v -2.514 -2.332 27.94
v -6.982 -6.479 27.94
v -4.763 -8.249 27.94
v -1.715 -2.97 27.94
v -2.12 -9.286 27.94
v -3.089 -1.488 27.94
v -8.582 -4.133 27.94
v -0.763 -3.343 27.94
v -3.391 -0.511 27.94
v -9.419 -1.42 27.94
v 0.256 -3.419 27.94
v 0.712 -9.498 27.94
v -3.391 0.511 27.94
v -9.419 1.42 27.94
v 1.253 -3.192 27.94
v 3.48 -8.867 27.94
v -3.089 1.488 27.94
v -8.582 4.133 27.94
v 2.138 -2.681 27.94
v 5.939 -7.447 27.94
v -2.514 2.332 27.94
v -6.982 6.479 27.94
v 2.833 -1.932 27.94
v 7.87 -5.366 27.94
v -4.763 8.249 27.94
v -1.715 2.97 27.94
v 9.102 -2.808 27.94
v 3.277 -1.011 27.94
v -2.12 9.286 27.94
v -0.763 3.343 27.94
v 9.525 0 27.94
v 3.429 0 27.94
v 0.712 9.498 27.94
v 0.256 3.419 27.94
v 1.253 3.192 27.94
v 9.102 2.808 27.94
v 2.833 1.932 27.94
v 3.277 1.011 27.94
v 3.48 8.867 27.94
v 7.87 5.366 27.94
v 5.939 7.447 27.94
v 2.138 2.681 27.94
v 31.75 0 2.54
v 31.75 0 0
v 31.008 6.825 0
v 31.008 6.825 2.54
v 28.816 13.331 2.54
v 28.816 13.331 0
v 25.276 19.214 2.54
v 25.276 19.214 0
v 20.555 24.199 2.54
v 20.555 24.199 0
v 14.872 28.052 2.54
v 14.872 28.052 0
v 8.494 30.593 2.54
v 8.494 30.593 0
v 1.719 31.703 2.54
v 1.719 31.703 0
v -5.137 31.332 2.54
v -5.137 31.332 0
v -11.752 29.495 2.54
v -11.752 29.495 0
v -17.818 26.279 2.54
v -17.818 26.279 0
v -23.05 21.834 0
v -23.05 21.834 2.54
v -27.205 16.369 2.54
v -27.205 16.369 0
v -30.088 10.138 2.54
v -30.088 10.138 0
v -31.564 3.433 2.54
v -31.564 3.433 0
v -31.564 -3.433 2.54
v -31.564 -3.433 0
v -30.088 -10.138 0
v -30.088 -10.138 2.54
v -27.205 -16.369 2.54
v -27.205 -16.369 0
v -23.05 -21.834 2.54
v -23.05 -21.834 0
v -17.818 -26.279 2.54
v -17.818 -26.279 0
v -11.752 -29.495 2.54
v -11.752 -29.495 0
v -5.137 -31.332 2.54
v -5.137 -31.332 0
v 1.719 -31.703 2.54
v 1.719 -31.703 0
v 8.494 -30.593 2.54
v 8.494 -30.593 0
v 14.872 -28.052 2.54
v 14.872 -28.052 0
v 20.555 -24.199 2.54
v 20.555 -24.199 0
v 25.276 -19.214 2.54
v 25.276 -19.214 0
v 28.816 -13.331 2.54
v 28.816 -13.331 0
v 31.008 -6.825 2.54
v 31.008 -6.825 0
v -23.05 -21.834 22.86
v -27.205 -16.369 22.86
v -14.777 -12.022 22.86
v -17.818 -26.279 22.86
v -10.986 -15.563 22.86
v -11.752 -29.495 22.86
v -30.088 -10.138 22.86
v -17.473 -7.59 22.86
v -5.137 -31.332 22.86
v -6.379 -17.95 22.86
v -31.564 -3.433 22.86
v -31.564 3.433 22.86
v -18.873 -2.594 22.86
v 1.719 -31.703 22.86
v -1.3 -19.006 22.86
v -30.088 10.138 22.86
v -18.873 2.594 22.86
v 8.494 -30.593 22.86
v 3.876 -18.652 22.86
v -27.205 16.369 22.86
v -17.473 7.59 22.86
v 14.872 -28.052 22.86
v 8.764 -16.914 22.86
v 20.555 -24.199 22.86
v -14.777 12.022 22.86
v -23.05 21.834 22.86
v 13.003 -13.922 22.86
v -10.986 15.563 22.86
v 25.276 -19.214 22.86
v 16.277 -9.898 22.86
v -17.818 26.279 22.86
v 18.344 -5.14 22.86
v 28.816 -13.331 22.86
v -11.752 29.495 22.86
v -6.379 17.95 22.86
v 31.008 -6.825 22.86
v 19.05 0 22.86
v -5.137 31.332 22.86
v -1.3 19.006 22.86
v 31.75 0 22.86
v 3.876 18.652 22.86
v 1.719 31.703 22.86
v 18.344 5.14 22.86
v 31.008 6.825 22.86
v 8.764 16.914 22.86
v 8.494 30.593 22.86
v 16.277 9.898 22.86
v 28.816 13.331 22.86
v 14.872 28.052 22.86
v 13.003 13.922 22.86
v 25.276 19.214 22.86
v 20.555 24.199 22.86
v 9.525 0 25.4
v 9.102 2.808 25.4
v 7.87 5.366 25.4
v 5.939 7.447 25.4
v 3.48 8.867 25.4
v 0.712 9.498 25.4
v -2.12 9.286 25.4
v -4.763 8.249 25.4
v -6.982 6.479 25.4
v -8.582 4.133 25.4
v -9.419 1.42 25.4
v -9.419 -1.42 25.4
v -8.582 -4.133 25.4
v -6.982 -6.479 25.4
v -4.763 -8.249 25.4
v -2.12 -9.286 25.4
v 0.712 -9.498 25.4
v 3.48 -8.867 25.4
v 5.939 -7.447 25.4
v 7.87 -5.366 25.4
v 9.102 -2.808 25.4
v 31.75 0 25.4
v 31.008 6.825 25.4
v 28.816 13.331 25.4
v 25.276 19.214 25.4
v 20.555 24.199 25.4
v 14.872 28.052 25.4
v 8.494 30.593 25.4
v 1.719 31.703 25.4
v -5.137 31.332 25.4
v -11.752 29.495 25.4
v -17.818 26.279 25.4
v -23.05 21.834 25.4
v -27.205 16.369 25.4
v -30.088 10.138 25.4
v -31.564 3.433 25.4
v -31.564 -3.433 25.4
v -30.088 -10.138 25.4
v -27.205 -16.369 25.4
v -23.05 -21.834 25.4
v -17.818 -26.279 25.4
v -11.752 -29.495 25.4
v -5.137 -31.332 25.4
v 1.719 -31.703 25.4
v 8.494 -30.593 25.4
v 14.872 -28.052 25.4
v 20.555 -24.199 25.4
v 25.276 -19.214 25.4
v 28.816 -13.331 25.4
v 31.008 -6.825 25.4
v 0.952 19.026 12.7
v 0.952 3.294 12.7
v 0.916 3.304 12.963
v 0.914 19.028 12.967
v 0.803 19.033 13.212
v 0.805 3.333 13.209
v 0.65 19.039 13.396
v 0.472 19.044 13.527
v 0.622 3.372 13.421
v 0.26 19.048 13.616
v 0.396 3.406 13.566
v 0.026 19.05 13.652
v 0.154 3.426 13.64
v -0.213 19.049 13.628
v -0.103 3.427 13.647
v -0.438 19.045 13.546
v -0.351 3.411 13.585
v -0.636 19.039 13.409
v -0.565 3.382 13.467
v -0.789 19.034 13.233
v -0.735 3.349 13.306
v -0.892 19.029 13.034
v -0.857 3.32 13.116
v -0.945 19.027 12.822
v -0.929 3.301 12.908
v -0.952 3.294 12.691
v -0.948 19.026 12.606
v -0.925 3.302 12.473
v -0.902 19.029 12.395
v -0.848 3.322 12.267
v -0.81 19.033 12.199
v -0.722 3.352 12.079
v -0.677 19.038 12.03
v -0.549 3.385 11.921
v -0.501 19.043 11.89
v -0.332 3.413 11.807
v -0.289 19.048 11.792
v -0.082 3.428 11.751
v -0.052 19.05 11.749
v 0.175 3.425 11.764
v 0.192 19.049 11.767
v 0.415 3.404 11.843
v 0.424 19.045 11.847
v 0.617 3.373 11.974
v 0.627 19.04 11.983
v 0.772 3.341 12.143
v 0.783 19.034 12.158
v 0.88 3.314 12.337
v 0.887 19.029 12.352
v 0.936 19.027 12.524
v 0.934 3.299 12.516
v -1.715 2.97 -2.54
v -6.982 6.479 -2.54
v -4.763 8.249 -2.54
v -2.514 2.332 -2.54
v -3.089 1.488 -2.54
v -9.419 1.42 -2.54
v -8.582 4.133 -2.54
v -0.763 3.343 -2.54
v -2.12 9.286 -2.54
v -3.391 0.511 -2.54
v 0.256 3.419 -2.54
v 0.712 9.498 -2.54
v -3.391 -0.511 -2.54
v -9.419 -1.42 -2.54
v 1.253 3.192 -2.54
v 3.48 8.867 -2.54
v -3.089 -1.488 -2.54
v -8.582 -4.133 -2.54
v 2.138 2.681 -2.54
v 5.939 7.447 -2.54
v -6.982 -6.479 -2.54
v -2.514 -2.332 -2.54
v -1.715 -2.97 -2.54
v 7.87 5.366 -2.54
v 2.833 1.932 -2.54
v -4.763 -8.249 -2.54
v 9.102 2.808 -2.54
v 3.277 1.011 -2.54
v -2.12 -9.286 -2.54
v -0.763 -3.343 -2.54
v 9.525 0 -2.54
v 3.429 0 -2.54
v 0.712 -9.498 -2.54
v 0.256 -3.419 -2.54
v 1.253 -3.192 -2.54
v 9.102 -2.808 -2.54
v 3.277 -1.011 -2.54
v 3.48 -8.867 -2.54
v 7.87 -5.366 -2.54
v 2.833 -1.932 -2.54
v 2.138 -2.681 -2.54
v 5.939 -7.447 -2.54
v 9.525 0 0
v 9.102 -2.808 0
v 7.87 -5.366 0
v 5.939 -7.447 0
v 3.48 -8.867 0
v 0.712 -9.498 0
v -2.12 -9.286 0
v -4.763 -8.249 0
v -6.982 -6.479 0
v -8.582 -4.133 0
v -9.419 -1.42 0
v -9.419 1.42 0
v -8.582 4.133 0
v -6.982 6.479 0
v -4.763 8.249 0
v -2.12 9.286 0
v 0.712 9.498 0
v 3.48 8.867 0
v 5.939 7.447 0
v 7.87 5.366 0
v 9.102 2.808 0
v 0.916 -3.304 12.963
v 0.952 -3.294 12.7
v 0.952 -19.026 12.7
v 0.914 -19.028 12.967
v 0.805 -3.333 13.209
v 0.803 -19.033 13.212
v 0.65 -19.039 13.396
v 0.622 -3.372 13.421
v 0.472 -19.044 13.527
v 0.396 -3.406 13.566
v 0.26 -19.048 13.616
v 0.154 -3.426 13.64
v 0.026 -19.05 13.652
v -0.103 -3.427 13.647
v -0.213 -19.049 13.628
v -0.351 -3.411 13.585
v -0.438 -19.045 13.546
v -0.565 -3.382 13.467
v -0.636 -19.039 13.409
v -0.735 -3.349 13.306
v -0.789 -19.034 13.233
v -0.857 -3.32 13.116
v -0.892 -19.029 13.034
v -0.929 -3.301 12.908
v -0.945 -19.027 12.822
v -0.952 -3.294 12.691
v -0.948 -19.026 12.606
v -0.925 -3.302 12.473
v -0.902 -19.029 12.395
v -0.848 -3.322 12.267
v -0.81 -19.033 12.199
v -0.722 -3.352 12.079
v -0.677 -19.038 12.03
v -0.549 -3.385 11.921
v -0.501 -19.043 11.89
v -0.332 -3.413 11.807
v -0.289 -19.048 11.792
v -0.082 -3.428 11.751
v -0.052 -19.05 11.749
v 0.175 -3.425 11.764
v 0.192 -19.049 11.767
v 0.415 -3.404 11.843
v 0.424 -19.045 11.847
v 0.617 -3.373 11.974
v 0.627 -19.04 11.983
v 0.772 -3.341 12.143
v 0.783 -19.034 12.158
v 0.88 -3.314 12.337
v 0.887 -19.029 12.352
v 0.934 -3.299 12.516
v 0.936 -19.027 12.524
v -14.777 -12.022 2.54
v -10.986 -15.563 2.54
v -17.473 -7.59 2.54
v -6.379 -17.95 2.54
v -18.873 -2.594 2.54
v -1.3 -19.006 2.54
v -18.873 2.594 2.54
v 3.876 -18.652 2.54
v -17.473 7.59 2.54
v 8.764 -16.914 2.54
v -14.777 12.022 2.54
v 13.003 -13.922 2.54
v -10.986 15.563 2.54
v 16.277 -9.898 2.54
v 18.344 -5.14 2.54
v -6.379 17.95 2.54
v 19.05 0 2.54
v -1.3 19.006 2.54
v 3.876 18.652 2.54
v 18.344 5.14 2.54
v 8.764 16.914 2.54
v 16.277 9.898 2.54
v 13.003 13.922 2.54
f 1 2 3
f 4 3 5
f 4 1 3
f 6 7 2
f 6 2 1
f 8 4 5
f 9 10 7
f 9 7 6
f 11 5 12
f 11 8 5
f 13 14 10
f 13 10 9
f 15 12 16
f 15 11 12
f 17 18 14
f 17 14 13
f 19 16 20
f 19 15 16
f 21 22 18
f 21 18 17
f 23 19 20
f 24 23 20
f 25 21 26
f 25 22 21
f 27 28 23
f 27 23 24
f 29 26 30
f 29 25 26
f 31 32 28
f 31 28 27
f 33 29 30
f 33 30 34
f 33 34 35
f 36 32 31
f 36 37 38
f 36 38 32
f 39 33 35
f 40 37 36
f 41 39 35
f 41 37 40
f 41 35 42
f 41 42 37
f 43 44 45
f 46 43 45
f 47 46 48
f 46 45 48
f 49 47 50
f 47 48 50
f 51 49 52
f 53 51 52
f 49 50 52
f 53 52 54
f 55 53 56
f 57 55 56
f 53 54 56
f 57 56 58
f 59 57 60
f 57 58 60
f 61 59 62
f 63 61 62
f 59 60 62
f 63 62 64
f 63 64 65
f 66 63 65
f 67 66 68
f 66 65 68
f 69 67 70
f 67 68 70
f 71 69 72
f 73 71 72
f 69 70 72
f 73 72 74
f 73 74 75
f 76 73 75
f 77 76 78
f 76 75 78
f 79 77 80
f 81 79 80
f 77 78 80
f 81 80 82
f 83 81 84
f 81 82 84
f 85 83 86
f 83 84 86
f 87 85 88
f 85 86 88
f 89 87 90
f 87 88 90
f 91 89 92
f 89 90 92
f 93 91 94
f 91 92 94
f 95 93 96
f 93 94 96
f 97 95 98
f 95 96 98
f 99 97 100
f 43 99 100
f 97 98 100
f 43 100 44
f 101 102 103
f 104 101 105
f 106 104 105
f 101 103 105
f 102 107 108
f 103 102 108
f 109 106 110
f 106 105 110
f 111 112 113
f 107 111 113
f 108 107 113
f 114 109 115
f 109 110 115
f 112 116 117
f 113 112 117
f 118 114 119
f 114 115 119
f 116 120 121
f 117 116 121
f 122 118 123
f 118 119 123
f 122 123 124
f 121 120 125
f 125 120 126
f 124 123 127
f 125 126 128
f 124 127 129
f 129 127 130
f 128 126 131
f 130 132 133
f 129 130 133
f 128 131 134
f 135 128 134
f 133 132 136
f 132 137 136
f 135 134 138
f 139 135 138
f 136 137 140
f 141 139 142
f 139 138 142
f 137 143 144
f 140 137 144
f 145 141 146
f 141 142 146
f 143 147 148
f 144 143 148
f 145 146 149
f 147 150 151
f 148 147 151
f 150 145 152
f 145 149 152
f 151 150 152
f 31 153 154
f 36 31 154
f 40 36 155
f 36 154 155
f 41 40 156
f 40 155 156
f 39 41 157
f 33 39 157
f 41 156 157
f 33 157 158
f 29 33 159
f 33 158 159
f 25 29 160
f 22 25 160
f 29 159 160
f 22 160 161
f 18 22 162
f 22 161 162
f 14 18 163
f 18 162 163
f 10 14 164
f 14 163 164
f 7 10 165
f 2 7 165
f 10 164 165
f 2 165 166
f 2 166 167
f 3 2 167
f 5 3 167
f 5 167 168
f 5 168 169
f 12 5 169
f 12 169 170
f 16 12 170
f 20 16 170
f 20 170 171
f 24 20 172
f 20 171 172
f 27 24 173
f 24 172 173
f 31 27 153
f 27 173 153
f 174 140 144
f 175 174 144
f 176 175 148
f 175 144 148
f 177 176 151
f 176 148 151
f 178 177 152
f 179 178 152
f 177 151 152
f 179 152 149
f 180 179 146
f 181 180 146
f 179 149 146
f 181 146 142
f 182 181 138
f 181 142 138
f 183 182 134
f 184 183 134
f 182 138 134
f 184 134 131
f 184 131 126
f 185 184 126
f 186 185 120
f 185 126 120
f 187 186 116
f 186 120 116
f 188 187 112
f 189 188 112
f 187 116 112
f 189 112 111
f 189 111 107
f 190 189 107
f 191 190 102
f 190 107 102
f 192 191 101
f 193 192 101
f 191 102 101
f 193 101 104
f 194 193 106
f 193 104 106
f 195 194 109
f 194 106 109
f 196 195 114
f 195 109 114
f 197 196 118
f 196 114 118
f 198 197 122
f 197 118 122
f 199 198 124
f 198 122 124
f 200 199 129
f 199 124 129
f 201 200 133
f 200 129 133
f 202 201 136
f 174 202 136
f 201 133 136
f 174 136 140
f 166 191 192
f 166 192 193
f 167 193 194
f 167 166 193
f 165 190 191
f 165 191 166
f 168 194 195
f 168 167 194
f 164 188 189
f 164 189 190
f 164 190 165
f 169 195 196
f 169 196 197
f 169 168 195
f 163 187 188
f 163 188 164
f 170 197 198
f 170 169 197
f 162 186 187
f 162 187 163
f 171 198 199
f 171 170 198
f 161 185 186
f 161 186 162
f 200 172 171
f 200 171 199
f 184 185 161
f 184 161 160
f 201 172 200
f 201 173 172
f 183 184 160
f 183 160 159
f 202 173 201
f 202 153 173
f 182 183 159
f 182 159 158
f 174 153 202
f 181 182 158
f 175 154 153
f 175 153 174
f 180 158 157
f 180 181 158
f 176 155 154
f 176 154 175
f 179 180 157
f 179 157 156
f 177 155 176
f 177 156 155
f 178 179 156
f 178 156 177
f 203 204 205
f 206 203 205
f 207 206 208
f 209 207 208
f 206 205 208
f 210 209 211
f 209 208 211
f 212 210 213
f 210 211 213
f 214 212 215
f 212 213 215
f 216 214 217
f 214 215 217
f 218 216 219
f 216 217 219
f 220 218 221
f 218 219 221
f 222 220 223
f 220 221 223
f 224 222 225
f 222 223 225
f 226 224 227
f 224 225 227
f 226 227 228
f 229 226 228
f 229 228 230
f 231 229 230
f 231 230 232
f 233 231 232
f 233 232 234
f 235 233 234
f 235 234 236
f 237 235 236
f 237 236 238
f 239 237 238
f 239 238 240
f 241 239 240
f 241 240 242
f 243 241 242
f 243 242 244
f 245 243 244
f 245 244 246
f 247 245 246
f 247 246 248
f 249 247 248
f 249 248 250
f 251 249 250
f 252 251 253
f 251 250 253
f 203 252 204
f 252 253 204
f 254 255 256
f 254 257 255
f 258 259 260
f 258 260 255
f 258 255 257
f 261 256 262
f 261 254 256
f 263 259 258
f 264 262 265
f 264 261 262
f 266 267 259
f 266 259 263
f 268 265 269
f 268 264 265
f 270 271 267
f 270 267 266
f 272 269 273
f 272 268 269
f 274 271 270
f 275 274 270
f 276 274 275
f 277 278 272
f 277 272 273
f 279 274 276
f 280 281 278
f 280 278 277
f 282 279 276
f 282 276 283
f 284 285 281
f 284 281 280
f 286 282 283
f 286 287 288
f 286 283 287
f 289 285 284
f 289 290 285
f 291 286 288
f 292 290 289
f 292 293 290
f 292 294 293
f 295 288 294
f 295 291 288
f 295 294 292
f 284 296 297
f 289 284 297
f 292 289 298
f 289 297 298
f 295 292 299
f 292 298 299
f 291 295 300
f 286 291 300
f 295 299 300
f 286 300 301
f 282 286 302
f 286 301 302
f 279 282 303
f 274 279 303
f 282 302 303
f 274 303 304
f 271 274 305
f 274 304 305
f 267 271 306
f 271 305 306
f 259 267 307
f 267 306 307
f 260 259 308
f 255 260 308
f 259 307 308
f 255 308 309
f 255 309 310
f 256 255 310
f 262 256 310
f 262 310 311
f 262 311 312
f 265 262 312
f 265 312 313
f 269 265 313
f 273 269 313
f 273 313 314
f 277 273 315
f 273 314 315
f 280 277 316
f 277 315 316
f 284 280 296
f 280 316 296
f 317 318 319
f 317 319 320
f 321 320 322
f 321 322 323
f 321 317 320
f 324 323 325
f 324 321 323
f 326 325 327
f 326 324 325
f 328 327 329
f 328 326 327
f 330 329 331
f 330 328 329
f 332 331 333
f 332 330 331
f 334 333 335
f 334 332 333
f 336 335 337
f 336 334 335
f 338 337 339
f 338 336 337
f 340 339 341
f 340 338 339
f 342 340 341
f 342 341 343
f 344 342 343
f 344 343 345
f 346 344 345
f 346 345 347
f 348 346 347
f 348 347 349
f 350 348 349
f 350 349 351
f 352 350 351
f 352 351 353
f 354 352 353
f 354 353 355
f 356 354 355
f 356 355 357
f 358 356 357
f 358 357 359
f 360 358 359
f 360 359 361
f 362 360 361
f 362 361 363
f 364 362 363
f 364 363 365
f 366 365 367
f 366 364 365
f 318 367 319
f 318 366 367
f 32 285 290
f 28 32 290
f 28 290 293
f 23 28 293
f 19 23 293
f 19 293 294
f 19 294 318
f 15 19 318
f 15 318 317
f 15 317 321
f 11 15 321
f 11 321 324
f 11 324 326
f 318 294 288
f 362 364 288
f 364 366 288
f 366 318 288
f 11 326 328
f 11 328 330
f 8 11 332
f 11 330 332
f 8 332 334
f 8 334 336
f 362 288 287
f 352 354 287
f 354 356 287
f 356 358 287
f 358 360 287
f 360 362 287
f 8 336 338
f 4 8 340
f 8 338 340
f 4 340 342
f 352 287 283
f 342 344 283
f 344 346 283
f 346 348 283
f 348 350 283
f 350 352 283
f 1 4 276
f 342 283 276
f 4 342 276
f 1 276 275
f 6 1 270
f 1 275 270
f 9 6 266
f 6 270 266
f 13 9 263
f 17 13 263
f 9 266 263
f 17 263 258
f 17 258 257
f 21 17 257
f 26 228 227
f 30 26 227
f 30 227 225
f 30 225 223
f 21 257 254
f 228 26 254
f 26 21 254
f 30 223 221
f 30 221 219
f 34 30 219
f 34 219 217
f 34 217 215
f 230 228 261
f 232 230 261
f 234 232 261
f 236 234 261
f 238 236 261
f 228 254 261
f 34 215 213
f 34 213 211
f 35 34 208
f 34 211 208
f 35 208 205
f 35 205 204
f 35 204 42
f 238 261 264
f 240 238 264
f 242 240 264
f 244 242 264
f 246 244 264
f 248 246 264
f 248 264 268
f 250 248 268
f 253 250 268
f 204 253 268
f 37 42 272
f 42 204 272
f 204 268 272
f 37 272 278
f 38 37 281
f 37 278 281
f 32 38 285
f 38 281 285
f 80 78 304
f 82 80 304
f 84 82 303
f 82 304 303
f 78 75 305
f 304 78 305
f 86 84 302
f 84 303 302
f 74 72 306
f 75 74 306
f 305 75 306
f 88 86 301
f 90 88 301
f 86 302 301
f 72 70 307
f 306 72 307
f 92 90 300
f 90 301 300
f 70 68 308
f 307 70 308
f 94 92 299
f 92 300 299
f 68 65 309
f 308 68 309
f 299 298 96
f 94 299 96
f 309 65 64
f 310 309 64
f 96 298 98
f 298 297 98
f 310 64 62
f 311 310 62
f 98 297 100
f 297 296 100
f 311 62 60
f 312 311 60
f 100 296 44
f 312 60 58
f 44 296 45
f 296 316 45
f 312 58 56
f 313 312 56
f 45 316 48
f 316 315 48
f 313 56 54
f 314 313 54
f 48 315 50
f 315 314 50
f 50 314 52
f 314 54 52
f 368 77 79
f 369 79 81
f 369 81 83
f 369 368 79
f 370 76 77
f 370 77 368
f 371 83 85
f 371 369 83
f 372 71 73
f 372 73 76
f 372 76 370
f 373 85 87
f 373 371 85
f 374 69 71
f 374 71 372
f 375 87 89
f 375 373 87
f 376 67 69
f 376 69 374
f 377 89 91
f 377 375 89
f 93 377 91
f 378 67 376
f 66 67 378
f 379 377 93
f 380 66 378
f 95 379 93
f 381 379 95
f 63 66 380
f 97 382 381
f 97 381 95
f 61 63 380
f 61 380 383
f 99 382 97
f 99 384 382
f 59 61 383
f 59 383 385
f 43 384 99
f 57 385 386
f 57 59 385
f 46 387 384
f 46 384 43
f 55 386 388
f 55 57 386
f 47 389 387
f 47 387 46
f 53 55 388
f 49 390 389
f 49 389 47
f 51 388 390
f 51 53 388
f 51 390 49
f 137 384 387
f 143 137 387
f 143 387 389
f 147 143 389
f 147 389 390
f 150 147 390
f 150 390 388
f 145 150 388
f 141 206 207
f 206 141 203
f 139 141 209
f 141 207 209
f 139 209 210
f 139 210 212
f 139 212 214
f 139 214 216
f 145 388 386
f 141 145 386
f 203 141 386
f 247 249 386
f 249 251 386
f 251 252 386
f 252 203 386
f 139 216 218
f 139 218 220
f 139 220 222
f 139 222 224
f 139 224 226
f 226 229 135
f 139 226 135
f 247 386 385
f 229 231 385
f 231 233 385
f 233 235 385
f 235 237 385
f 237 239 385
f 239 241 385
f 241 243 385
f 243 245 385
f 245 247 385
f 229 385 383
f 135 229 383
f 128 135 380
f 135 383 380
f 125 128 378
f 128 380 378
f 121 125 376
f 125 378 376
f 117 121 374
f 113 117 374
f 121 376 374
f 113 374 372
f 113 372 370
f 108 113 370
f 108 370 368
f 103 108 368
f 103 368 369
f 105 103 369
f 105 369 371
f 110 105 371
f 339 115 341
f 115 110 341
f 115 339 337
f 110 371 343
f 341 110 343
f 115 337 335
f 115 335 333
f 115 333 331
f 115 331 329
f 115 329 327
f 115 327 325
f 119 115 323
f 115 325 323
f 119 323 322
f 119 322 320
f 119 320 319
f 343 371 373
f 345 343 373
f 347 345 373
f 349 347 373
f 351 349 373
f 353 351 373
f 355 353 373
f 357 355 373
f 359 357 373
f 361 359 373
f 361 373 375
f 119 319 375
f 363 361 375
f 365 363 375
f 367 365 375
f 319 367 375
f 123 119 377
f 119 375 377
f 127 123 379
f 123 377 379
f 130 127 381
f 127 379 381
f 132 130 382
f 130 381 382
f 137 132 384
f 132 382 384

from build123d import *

# Parameters (mm, degrees)
F0_R           = 31.75
F1_DEPTH       = 2.54
F2_R           = 19.05
F3_DEPTH       = 20.32
F4_R           = 31.75
F4_R_2         = 19.05
F5_DEPTH       = 2.54
F6_R           = 9.525
F7_DEPTH       = 2.54
F8_R           = 9.525
F9_DEPTH       = 2.54
F10_R          = 3.429
F11_DEPTH      = 30.48
F12_R          = 0.9525
F13_DEPTH      = 25.4
F13_DEPTH_BACK = 25.4


with BuildPart() as f1:
    # F0 (on Top) → F1 (new body)
    with BuildSketch(Plane.XY):
        Circle(F0_R)
    extrude(amount=F1_DEPTH)

    # F2 (on face) → F3 (join)
    with BuildSketch(Plane.XY.offset(2.54)):
        Circle(F2_R)
    extrude(amount=F3_DEPTH)

    # F4 (on face) → F5 (join)
    with BuildSketch(Plane.XY.offset(22.86)):
        Circle(F4_R)
        Circle(F4_R_2, mode=Mode.SUBTRACT)
        Circle(F4_R_2)
    extrude(amount=F5_DEPTH)

    # F6 (on face) → F7 (join)
    with BuildSketch(Plane.XY.offset(25.4)):
        Circle(F6_R)
    extrude(amount=F7_DEPTH)

    # F8 (on face) → F9 (join)
    with BuildSketch(Plane(origin=(0, 0, 0), x_dir=(1, 0, 0), z_dir=(0, 0, -1))):
        Circle(F8_R)
    extrude(amount=F9_DEPTH)

    # F10 (on face) → F11 (cut)
    with BuildSketch(Plane(origin=(0, 0, -2.54), x_dir=(1, 0, 0), z_dir=(0, 0, -1))):
        Circle(F10_R)
    extrude(amount=-F11_DEPTH, mode=Mode.SUBTRACT)

    # F12 (on Front) → F13 (cut, two sides)
    with BuildSketch(Plane.XZ) as f13_sk:
        with Locations((0, 12.7)):
            Circle(F12_R)
    extrude(amount=-F13_DEPTH, mode=Mode.SUBTRACT)
    extrude(f13_sk.sketch, amount=F13_DEPTH_BACK, mode=Mode.SUBTRACT)


solid = f1.part
